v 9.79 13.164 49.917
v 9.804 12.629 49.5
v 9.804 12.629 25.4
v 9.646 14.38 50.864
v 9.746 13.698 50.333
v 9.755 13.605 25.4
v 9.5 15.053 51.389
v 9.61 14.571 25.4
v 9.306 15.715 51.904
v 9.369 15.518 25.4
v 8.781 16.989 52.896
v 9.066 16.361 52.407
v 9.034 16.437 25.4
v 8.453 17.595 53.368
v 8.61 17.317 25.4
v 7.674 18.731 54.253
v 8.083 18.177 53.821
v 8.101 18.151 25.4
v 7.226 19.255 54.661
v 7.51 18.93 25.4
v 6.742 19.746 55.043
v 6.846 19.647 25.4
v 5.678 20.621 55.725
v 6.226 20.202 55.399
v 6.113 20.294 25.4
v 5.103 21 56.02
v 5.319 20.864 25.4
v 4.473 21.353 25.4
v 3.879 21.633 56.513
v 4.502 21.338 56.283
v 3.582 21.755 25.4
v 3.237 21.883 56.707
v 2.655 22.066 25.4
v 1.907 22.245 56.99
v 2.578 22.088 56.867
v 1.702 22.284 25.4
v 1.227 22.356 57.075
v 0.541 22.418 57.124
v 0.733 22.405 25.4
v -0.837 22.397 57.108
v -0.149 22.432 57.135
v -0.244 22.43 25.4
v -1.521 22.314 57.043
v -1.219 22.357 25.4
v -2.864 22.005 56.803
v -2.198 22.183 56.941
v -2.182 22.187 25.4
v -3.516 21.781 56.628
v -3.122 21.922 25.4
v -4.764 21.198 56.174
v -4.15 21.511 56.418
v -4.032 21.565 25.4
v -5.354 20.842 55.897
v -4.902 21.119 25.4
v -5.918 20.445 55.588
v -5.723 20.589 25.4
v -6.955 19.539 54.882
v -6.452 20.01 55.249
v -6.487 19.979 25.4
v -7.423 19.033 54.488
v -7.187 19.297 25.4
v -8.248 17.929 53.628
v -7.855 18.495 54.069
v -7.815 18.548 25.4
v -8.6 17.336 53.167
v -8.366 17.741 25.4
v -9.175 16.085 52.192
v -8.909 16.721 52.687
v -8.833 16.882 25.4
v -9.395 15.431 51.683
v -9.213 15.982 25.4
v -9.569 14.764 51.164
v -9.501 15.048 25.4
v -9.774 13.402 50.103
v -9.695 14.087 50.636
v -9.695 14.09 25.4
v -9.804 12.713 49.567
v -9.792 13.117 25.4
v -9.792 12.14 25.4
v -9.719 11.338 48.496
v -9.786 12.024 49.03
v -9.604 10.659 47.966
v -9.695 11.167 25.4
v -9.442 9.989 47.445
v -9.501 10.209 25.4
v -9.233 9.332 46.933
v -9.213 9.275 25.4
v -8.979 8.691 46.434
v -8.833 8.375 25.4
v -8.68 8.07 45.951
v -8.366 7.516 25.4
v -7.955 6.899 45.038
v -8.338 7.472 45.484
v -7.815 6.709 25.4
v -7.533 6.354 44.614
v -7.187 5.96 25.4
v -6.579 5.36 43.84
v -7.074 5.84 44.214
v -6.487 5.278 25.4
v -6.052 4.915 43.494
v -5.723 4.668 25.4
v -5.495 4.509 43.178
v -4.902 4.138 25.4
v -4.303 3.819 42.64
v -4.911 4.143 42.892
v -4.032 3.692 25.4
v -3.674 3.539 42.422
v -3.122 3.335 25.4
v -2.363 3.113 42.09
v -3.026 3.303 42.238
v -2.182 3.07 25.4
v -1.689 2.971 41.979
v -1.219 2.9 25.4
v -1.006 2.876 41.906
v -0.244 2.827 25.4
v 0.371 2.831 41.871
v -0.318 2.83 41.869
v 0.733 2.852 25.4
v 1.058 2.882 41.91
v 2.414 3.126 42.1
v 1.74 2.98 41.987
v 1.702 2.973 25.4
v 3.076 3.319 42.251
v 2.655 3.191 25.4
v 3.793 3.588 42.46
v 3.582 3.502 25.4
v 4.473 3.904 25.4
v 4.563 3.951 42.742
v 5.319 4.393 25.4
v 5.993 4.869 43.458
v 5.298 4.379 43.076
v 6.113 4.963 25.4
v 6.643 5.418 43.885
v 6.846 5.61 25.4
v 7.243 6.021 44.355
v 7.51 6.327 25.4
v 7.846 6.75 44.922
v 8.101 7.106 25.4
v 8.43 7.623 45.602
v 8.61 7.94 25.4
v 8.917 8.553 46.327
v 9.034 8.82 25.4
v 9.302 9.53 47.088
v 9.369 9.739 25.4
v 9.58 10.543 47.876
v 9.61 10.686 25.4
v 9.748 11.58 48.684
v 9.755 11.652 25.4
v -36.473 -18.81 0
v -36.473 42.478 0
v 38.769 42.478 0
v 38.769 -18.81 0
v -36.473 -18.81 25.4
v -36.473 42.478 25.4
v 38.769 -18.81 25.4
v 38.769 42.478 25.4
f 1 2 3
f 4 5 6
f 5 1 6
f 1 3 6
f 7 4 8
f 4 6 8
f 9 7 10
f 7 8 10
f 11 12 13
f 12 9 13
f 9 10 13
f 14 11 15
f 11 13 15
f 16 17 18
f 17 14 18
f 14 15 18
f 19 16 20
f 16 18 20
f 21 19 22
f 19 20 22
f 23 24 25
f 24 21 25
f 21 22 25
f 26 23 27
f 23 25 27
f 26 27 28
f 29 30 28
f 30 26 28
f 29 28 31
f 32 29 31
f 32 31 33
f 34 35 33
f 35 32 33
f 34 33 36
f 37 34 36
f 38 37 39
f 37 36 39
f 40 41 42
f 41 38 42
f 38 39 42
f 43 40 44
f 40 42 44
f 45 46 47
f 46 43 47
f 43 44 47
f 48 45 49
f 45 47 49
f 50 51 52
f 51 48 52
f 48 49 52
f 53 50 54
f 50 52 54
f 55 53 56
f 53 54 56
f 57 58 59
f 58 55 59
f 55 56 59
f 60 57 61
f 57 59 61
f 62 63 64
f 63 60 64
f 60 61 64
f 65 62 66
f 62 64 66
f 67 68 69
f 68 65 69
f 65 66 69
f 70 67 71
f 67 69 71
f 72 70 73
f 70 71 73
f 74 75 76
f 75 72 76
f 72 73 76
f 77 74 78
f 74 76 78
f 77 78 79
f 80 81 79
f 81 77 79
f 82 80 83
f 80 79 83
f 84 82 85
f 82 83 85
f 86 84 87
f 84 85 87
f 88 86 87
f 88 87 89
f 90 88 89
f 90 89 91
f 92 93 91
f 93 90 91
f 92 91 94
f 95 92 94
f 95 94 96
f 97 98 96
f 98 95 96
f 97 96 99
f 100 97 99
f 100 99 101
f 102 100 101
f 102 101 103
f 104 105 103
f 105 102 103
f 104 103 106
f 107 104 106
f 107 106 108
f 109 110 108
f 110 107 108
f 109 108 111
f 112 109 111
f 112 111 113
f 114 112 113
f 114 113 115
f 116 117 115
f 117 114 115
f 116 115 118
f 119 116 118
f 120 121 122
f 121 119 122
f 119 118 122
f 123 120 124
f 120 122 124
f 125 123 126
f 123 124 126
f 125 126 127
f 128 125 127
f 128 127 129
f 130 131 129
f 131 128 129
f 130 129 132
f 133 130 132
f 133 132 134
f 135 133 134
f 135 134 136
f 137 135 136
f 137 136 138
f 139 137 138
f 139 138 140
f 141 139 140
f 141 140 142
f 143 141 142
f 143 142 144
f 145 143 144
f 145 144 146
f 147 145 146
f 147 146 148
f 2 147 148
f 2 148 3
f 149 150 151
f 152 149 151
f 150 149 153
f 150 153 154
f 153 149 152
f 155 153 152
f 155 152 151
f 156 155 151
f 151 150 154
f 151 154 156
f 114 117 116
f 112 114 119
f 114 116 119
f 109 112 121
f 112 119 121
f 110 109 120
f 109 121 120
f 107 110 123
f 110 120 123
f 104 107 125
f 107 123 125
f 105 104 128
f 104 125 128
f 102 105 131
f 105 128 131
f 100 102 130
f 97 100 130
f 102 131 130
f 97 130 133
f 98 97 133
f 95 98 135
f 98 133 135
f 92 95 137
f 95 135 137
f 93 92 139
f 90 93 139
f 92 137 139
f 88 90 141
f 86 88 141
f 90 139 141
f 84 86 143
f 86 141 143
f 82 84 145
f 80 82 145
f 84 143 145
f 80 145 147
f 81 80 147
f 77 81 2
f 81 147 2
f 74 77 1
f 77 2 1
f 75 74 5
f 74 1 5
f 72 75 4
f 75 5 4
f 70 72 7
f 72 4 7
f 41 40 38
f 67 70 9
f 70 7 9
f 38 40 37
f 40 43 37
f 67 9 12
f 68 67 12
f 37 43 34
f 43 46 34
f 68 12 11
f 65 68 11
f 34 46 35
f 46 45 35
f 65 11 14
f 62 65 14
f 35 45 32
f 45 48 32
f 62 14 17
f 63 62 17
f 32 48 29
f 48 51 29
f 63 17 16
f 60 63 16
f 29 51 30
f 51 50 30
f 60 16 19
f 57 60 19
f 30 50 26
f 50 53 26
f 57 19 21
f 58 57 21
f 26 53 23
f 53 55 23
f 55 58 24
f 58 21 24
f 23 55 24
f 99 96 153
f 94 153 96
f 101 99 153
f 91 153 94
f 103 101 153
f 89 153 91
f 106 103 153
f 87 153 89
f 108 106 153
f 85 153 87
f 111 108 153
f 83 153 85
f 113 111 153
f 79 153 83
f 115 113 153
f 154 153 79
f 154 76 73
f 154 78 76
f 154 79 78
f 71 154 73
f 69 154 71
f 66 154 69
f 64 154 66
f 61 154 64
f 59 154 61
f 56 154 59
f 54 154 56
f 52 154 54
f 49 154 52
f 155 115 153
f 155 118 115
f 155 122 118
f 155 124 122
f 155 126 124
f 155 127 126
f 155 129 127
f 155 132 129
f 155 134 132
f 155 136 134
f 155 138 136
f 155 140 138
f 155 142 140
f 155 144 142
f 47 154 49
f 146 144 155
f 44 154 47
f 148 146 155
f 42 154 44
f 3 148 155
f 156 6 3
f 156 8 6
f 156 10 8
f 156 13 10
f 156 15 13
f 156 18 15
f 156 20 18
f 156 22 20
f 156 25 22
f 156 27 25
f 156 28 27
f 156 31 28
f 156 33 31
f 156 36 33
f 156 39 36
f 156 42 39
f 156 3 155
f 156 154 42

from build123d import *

# Parameters (mm, degrees)
F0_W     = 75.241194
F0_H     = 61.288014
F0_R     = 9.804141
F1_DEPTH = 25.4
F2_DEPTH = 57.15
F4_DEPTH = 23.876


with BuildPart() as f1:
    # F0 (on Top) → F1 (new body)
    with BuildSketch(Plane.XY):
        with Locations((1.148045, 11.833709)):
            Rectangle(F0_W, F0_H)
        with Locations((0, 12.628511)):
            Circle(F0_R, mode=Mode.SUBTRACT)
    extrude(amount=F1_DEPTH)

    # F0 (on Top) → F2 (join)
    with BuildSketch(Plane.XY):
        with Locations((0, 12.628511)):
            Circle(F0_R)
    extrude(amount=F2_DEPTH)

    # F3 (on Right) → F4 (cut, symmetric)
    with BuildSketch(Plane.YZ):
        Polygon((-5.740232, 67.381494), (-4.327252, 36.295928), (35.589438, 67.381494), align=None)
    extrude(amount=F4_DEPTH, both=True, mode=Mode.SUBTRACT)


solid = f1.part
